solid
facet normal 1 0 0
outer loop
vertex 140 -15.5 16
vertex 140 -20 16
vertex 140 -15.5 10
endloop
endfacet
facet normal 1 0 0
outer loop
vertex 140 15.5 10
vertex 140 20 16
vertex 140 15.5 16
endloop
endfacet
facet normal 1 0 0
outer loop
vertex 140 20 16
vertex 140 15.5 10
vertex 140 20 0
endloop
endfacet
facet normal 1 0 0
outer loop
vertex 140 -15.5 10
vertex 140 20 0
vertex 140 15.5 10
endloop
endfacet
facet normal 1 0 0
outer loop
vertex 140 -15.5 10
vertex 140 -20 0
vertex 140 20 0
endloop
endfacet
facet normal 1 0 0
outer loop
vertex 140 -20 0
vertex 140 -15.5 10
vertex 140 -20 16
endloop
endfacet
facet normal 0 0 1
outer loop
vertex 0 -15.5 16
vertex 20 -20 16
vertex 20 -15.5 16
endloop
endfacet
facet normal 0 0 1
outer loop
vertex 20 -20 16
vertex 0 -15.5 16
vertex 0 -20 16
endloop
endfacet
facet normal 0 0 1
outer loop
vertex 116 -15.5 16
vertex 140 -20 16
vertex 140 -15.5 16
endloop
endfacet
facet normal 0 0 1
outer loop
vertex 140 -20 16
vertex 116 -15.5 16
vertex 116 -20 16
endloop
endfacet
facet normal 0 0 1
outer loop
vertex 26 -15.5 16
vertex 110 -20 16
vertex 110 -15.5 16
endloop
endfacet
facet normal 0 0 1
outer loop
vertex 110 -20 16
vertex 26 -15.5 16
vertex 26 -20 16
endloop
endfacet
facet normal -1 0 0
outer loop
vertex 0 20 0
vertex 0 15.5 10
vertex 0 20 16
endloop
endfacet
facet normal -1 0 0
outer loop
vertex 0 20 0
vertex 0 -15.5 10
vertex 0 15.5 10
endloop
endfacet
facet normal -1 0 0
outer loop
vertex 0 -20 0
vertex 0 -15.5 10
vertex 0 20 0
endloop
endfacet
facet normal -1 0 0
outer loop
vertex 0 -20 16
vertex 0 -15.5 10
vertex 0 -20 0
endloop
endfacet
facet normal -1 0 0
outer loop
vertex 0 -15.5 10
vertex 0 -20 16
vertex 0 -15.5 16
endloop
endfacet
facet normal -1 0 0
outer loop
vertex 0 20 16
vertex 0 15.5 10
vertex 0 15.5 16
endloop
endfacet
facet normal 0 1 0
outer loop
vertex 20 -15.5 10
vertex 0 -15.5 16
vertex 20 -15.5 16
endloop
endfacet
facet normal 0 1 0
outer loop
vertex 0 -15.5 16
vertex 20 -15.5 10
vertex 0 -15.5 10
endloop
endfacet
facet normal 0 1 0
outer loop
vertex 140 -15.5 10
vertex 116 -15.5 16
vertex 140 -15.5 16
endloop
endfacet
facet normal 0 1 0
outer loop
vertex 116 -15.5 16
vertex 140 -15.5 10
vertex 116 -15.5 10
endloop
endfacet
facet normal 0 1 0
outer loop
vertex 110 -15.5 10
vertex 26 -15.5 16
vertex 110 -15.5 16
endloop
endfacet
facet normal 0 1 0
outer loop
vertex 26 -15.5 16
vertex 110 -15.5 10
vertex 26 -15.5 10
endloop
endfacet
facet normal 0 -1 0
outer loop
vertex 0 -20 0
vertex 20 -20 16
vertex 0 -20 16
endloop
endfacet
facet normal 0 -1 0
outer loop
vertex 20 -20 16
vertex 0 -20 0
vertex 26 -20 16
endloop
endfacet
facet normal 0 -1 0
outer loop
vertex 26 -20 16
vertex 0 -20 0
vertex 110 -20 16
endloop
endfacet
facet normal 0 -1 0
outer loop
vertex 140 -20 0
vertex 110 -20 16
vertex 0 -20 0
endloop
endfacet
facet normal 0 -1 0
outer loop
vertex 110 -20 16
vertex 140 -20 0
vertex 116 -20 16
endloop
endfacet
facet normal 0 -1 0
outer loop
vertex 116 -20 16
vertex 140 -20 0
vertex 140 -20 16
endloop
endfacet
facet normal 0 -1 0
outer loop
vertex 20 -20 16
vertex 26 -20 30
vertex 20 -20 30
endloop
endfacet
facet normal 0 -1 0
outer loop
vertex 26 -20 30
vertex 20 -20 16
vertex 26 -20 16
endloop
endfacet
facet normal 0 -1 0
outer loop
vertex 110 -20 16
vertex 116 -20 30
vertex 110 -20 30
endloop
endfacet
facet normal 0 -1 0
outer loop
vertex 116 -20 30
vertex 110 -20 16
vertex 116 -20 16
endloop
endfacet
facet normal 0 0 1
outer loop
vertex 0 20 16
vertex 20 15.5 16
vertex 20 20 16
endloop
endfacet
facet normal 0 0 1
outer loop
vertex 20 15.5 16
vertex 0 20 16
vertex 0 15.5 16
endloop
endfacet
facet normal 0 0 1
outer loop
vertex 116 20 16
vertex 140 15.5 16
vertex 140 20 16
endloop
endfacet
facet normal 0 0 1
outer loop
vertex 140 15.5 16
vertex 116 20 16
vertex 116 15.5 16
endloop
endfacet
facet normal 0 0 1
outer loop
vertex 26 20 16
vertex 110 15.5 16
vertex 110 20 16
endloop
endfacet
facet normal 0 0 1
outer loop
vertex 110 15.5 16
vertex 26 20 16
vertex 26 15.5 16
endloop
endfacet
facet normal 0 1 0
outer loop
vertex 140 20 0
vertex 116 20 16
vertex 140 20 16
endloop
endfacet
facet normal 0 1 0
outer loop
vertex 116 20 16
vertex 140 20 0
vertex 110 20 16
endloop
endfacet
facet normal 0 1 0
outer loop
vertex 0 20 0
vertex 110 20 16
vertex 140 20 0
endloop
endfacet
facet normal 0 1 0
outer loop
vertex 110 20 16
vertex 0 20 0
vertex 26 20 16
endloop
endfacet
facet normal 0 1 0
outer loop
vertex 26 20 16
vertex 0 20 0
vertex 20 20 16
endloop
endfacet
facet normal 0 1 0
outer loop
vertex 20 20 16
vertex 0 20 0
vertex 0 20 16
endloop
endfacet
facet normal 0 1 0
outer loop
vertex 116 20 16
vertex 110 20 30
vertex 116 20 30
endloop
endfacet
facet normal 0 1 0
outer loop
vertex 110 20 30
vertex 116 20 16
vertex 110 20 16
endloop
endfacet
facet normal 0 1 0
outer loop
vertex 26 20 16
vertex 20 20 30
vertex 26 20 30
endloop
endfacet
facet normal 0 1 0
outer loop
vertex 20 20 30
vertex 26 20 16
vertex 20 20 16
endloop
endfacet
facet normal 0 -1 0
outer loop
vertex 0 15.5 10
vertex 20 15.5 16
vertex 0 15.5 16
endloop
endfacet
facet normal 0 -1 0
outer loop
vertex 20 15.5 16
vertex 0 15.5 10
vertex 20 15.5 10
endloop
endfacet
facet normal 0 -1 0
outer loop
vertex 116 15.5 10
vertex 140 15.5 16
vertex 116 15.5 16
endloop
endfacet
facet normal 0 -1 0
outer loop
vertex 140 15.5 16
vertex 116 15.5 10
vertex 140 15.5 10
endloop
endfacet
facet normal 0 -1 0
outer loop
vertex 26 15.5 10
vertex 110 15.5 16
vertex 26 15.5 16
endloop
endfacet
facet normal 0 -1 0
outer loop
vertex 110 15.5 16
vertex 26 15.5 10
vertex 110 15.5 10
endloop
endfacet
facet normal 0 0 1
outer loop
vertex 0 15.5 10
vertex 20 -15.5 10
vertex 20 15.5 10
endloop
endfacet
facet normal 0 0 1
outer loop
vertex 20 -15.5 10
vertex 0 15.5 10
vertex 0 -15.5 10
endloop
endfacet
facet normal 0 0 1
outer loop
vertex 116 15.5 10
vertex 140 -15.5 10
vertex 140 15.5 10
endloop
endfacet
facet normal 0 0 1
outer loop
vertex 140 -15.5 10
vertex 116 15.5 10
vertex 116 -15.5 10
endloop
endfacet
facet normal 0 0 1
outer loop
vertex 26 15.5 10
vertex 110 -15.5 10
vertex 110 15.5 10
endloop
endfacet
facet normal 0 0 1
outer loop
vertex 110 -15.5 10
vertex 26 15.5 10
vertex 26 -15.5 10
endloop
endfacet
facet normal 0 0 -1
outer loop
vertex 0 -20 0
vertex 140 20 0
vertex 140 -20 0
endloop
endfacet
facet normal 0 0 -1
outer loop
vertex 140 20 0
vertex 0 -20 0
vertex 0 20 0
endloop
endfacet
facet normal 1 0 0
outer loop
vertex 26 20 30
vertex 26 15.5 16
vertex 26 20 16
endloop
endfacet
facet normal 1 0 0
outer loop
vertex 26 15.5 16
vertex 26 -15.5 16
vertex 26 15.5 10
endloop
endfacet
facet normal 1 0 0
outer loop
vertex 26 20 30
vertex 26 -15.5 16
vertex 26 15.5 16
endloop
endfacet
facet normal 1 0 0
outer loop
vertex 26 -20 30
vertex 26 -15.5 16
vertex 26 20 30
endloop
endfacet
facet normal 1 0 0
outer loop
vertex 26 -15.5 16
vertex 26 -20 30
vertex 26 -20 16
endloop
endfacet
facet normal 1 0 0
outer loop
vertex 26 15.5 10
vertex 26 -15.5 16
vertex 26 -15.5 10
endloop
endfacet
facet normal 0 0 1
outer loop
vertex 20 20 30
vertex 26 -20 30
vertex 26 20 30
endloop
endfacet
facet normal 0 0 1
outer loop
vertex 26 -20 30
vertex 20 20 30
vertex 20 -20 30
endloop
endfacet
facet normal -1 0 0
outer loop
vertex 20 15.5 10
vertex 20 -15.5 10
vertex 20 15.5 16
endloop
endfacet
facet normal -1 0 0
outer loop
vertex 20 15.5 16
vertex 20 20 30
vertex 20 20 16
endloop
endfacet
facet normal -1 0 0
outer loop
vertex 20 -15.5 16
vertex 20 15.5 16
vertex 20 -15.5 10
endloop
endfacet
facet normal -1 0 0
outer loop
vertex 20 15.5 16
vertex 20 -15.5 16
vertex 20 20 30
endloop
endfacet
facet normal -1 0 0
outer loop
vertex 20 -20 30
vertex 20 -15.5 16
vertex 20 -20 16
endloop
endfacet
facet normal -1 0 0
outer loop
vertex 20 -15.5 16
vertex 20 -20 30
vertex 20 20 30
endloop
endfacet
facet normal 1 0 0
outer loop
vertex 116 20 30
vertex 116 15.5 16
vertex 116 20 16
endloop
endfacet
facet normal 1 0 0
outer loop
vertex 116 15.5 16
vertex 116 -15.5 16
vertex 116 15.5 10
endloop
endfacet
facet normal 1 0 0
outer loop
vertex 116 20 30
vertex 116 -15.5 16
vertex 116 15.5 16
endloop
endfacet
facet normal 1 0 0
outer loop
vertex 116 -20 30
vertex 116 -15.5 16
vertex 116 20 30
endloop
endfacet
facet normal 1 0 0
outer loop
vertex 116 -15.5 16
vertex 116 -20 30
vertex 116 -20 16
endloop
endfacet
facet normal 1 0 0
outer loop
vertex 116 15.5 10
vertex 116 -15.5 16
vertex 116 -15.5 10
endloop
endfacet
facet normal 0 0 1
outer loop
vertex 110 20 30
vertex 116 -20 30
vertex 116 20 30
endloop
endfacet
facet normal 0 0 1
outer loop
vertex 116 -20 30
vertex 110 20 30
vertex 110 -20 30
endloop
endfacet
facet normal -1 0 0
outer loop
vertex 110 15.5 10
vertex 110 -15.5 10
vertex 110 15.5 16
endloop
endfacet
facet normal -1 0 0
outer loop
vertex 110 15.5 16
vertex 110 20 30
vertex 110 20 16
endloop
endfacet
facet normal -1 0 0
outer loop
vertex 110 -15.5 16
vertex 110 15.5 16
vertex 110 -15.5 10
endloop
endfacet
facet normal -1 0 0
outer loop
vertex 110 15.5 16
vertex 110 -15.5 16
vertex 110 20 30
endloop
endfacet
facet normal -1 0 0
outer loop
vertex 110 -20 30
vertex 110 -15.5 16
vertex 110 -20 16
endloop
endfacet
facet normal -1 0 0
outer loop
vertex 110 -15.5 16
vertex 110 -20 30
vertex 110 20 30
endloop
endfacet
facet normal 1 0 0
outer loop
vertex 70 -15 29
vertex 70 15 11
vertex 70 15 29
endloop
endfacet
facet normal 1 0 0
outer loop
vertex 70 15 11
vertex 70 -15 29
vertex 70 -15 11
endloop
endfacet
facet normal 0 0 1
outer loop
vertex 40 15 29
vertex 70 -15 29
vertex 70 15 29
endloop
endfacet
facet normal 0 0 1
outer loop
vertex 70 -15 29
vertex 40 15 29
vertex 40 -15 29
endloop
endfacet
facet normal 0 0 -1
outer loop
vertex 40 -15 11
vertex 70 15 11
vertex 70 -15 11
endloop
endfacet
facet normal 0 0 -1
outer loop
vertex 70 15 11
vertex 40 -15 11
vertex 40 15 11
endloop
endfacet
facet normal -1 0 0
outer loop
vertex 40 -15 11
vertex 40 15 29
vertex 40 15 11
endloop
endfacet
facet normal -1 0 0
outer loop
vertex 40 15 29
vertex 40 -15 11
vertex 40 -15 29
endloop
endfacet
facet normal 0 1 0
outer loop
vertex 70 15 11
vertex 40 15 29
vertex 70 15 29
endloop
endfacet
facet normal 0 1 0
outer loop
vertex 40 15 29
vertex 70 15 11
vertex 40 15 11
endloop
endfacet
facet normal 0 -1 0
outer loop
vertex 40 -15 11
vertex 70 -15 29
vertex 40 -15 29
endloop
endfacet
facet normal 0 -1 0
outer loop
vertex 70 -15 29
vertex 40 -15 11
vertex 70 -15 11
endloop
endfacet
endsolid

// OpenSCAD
// A leadscrew stage, driven past both of its end stops.
//
// One mate does the whole job. A screw() holds the carriage on the rail *and*
// ties turning to advancing, so driving its travel turns it — and when the
// carriage runs into a stop, the thread cannot advance, so it cannot turn
// either. The motor stalls because the geometry says so.
//
// The stops are the point of this model. They are part of the rail, which is
// how anybody would draw them and how a mate quietly loses them: two parts a
// mate joins do not also touch, because a hinge lives inside both the door and
// the frame and leaving that contact on makes the contact and the constraint
// fight. The carriage is mated to the very part carrying its stops, so by
// default it slides straight through them — in the interference check and the
// travel sweep as well as in the simulation, silently, all three agreeing with
// each other and all three wrong about the machine.
//
// `collide = true` is the answer, and it is worth knowing the alternative: put
// the stops on a part of their own, which is what the first bench does with its
// lid and its stop.
//
// Asked for 60 mm it reaches 40, and asked for -40 it reaches -14. Neither
// number is written down anywhere. Both are where the metal is.

module part(name, fixed = false, density = undef, mass = undef,
            collider = undef, friction = undef, bounce = undef) { children(); }
module screw(name, parts, at, axis, pitch, range, collide) { }
module drive(name, to, over, at, torque, speed) { }

STEEL   = 0.0078;
PLASTIC = 0.0012;

BED   = 10;              // top of the rail bed
RIDE  = 11;              // and the underside of the carriage, a hair above it
STOP_A = 26;             // the near stop's inner face
STOP_B = 110;            // the far one's

part("frame", fixed = true)
    color("slategray") {
        translate([0, -20, 0]) cube([140, 40, BED]);
        // Overlapping the bed rather than sitting exactly on it: two solids
        // with exactly coplanar touching faces are the worst case an exact
        // boolean kernel has, and it is free to avoid.
        translate([STOP_A - 6, -20, BED - 2]) cube([6, 40, 22]);
        translate([STOP_B, -20, BED - 2]) cube([6, 40, 22]);
        // Two gibs down the length of the bed, half a millimetre off the
        // carriage either side. Flat ways and a pair of gibs: the bed takes the
        // weight, the gibs take everything sideways, and gravity closes the
        // joint. That is what a machine slide is, and without them a slider()
        // naming this part was the only thing keeping the carriage on its line.
        //
        // It is also the *one* shape of guide this model can have. Every other
        // carriage in the tour wraps its rail — over the head, under it, either
        // side — because capture is what a prismatic joint wants. Capture needs
        // a concave carriage, and a moving part's collider is its convex hull,
        // which fills the channel back in. Everywhere else that costs nothing,
        // because the pair is mated and never collides. Here it is mated *and*
        // colliding, and a wrapped carriage would spend the whole run trying to
        // push its own hull out of the rail it is threaded on.
        color("dimgray") {
            translate([0, -20, BED - 2]) cube([140, 4.5, 8]);
            translate([0, 15.5, BED - 2]) cube([140, 4.5, 8]);
        }
    }

part("carriage", density = PLASTIC, friction = 0.1)
    color("steelblue") translate([40, -15, RIDE]) cube([30, 30, 18]);

// One mate: a helix. `collide = true` is what lets it notice the stops that are
// drawn on the very part it is mated to.
screw("lead", parts = ["carriage", "frame"], at = [40, 0, RIDE],
      axis = [1, 0, 0], pitch = 2.5, range = [-40, 60], collide = true);

// Out until it runs out of rail, then back until it runs out the other way.
drive("lead", to = 60,  over = 2.0, at = 0.3, torque = 900000);
drive("lead", to = -40, over = 2.0, at = 3.0, torque = 900000);
